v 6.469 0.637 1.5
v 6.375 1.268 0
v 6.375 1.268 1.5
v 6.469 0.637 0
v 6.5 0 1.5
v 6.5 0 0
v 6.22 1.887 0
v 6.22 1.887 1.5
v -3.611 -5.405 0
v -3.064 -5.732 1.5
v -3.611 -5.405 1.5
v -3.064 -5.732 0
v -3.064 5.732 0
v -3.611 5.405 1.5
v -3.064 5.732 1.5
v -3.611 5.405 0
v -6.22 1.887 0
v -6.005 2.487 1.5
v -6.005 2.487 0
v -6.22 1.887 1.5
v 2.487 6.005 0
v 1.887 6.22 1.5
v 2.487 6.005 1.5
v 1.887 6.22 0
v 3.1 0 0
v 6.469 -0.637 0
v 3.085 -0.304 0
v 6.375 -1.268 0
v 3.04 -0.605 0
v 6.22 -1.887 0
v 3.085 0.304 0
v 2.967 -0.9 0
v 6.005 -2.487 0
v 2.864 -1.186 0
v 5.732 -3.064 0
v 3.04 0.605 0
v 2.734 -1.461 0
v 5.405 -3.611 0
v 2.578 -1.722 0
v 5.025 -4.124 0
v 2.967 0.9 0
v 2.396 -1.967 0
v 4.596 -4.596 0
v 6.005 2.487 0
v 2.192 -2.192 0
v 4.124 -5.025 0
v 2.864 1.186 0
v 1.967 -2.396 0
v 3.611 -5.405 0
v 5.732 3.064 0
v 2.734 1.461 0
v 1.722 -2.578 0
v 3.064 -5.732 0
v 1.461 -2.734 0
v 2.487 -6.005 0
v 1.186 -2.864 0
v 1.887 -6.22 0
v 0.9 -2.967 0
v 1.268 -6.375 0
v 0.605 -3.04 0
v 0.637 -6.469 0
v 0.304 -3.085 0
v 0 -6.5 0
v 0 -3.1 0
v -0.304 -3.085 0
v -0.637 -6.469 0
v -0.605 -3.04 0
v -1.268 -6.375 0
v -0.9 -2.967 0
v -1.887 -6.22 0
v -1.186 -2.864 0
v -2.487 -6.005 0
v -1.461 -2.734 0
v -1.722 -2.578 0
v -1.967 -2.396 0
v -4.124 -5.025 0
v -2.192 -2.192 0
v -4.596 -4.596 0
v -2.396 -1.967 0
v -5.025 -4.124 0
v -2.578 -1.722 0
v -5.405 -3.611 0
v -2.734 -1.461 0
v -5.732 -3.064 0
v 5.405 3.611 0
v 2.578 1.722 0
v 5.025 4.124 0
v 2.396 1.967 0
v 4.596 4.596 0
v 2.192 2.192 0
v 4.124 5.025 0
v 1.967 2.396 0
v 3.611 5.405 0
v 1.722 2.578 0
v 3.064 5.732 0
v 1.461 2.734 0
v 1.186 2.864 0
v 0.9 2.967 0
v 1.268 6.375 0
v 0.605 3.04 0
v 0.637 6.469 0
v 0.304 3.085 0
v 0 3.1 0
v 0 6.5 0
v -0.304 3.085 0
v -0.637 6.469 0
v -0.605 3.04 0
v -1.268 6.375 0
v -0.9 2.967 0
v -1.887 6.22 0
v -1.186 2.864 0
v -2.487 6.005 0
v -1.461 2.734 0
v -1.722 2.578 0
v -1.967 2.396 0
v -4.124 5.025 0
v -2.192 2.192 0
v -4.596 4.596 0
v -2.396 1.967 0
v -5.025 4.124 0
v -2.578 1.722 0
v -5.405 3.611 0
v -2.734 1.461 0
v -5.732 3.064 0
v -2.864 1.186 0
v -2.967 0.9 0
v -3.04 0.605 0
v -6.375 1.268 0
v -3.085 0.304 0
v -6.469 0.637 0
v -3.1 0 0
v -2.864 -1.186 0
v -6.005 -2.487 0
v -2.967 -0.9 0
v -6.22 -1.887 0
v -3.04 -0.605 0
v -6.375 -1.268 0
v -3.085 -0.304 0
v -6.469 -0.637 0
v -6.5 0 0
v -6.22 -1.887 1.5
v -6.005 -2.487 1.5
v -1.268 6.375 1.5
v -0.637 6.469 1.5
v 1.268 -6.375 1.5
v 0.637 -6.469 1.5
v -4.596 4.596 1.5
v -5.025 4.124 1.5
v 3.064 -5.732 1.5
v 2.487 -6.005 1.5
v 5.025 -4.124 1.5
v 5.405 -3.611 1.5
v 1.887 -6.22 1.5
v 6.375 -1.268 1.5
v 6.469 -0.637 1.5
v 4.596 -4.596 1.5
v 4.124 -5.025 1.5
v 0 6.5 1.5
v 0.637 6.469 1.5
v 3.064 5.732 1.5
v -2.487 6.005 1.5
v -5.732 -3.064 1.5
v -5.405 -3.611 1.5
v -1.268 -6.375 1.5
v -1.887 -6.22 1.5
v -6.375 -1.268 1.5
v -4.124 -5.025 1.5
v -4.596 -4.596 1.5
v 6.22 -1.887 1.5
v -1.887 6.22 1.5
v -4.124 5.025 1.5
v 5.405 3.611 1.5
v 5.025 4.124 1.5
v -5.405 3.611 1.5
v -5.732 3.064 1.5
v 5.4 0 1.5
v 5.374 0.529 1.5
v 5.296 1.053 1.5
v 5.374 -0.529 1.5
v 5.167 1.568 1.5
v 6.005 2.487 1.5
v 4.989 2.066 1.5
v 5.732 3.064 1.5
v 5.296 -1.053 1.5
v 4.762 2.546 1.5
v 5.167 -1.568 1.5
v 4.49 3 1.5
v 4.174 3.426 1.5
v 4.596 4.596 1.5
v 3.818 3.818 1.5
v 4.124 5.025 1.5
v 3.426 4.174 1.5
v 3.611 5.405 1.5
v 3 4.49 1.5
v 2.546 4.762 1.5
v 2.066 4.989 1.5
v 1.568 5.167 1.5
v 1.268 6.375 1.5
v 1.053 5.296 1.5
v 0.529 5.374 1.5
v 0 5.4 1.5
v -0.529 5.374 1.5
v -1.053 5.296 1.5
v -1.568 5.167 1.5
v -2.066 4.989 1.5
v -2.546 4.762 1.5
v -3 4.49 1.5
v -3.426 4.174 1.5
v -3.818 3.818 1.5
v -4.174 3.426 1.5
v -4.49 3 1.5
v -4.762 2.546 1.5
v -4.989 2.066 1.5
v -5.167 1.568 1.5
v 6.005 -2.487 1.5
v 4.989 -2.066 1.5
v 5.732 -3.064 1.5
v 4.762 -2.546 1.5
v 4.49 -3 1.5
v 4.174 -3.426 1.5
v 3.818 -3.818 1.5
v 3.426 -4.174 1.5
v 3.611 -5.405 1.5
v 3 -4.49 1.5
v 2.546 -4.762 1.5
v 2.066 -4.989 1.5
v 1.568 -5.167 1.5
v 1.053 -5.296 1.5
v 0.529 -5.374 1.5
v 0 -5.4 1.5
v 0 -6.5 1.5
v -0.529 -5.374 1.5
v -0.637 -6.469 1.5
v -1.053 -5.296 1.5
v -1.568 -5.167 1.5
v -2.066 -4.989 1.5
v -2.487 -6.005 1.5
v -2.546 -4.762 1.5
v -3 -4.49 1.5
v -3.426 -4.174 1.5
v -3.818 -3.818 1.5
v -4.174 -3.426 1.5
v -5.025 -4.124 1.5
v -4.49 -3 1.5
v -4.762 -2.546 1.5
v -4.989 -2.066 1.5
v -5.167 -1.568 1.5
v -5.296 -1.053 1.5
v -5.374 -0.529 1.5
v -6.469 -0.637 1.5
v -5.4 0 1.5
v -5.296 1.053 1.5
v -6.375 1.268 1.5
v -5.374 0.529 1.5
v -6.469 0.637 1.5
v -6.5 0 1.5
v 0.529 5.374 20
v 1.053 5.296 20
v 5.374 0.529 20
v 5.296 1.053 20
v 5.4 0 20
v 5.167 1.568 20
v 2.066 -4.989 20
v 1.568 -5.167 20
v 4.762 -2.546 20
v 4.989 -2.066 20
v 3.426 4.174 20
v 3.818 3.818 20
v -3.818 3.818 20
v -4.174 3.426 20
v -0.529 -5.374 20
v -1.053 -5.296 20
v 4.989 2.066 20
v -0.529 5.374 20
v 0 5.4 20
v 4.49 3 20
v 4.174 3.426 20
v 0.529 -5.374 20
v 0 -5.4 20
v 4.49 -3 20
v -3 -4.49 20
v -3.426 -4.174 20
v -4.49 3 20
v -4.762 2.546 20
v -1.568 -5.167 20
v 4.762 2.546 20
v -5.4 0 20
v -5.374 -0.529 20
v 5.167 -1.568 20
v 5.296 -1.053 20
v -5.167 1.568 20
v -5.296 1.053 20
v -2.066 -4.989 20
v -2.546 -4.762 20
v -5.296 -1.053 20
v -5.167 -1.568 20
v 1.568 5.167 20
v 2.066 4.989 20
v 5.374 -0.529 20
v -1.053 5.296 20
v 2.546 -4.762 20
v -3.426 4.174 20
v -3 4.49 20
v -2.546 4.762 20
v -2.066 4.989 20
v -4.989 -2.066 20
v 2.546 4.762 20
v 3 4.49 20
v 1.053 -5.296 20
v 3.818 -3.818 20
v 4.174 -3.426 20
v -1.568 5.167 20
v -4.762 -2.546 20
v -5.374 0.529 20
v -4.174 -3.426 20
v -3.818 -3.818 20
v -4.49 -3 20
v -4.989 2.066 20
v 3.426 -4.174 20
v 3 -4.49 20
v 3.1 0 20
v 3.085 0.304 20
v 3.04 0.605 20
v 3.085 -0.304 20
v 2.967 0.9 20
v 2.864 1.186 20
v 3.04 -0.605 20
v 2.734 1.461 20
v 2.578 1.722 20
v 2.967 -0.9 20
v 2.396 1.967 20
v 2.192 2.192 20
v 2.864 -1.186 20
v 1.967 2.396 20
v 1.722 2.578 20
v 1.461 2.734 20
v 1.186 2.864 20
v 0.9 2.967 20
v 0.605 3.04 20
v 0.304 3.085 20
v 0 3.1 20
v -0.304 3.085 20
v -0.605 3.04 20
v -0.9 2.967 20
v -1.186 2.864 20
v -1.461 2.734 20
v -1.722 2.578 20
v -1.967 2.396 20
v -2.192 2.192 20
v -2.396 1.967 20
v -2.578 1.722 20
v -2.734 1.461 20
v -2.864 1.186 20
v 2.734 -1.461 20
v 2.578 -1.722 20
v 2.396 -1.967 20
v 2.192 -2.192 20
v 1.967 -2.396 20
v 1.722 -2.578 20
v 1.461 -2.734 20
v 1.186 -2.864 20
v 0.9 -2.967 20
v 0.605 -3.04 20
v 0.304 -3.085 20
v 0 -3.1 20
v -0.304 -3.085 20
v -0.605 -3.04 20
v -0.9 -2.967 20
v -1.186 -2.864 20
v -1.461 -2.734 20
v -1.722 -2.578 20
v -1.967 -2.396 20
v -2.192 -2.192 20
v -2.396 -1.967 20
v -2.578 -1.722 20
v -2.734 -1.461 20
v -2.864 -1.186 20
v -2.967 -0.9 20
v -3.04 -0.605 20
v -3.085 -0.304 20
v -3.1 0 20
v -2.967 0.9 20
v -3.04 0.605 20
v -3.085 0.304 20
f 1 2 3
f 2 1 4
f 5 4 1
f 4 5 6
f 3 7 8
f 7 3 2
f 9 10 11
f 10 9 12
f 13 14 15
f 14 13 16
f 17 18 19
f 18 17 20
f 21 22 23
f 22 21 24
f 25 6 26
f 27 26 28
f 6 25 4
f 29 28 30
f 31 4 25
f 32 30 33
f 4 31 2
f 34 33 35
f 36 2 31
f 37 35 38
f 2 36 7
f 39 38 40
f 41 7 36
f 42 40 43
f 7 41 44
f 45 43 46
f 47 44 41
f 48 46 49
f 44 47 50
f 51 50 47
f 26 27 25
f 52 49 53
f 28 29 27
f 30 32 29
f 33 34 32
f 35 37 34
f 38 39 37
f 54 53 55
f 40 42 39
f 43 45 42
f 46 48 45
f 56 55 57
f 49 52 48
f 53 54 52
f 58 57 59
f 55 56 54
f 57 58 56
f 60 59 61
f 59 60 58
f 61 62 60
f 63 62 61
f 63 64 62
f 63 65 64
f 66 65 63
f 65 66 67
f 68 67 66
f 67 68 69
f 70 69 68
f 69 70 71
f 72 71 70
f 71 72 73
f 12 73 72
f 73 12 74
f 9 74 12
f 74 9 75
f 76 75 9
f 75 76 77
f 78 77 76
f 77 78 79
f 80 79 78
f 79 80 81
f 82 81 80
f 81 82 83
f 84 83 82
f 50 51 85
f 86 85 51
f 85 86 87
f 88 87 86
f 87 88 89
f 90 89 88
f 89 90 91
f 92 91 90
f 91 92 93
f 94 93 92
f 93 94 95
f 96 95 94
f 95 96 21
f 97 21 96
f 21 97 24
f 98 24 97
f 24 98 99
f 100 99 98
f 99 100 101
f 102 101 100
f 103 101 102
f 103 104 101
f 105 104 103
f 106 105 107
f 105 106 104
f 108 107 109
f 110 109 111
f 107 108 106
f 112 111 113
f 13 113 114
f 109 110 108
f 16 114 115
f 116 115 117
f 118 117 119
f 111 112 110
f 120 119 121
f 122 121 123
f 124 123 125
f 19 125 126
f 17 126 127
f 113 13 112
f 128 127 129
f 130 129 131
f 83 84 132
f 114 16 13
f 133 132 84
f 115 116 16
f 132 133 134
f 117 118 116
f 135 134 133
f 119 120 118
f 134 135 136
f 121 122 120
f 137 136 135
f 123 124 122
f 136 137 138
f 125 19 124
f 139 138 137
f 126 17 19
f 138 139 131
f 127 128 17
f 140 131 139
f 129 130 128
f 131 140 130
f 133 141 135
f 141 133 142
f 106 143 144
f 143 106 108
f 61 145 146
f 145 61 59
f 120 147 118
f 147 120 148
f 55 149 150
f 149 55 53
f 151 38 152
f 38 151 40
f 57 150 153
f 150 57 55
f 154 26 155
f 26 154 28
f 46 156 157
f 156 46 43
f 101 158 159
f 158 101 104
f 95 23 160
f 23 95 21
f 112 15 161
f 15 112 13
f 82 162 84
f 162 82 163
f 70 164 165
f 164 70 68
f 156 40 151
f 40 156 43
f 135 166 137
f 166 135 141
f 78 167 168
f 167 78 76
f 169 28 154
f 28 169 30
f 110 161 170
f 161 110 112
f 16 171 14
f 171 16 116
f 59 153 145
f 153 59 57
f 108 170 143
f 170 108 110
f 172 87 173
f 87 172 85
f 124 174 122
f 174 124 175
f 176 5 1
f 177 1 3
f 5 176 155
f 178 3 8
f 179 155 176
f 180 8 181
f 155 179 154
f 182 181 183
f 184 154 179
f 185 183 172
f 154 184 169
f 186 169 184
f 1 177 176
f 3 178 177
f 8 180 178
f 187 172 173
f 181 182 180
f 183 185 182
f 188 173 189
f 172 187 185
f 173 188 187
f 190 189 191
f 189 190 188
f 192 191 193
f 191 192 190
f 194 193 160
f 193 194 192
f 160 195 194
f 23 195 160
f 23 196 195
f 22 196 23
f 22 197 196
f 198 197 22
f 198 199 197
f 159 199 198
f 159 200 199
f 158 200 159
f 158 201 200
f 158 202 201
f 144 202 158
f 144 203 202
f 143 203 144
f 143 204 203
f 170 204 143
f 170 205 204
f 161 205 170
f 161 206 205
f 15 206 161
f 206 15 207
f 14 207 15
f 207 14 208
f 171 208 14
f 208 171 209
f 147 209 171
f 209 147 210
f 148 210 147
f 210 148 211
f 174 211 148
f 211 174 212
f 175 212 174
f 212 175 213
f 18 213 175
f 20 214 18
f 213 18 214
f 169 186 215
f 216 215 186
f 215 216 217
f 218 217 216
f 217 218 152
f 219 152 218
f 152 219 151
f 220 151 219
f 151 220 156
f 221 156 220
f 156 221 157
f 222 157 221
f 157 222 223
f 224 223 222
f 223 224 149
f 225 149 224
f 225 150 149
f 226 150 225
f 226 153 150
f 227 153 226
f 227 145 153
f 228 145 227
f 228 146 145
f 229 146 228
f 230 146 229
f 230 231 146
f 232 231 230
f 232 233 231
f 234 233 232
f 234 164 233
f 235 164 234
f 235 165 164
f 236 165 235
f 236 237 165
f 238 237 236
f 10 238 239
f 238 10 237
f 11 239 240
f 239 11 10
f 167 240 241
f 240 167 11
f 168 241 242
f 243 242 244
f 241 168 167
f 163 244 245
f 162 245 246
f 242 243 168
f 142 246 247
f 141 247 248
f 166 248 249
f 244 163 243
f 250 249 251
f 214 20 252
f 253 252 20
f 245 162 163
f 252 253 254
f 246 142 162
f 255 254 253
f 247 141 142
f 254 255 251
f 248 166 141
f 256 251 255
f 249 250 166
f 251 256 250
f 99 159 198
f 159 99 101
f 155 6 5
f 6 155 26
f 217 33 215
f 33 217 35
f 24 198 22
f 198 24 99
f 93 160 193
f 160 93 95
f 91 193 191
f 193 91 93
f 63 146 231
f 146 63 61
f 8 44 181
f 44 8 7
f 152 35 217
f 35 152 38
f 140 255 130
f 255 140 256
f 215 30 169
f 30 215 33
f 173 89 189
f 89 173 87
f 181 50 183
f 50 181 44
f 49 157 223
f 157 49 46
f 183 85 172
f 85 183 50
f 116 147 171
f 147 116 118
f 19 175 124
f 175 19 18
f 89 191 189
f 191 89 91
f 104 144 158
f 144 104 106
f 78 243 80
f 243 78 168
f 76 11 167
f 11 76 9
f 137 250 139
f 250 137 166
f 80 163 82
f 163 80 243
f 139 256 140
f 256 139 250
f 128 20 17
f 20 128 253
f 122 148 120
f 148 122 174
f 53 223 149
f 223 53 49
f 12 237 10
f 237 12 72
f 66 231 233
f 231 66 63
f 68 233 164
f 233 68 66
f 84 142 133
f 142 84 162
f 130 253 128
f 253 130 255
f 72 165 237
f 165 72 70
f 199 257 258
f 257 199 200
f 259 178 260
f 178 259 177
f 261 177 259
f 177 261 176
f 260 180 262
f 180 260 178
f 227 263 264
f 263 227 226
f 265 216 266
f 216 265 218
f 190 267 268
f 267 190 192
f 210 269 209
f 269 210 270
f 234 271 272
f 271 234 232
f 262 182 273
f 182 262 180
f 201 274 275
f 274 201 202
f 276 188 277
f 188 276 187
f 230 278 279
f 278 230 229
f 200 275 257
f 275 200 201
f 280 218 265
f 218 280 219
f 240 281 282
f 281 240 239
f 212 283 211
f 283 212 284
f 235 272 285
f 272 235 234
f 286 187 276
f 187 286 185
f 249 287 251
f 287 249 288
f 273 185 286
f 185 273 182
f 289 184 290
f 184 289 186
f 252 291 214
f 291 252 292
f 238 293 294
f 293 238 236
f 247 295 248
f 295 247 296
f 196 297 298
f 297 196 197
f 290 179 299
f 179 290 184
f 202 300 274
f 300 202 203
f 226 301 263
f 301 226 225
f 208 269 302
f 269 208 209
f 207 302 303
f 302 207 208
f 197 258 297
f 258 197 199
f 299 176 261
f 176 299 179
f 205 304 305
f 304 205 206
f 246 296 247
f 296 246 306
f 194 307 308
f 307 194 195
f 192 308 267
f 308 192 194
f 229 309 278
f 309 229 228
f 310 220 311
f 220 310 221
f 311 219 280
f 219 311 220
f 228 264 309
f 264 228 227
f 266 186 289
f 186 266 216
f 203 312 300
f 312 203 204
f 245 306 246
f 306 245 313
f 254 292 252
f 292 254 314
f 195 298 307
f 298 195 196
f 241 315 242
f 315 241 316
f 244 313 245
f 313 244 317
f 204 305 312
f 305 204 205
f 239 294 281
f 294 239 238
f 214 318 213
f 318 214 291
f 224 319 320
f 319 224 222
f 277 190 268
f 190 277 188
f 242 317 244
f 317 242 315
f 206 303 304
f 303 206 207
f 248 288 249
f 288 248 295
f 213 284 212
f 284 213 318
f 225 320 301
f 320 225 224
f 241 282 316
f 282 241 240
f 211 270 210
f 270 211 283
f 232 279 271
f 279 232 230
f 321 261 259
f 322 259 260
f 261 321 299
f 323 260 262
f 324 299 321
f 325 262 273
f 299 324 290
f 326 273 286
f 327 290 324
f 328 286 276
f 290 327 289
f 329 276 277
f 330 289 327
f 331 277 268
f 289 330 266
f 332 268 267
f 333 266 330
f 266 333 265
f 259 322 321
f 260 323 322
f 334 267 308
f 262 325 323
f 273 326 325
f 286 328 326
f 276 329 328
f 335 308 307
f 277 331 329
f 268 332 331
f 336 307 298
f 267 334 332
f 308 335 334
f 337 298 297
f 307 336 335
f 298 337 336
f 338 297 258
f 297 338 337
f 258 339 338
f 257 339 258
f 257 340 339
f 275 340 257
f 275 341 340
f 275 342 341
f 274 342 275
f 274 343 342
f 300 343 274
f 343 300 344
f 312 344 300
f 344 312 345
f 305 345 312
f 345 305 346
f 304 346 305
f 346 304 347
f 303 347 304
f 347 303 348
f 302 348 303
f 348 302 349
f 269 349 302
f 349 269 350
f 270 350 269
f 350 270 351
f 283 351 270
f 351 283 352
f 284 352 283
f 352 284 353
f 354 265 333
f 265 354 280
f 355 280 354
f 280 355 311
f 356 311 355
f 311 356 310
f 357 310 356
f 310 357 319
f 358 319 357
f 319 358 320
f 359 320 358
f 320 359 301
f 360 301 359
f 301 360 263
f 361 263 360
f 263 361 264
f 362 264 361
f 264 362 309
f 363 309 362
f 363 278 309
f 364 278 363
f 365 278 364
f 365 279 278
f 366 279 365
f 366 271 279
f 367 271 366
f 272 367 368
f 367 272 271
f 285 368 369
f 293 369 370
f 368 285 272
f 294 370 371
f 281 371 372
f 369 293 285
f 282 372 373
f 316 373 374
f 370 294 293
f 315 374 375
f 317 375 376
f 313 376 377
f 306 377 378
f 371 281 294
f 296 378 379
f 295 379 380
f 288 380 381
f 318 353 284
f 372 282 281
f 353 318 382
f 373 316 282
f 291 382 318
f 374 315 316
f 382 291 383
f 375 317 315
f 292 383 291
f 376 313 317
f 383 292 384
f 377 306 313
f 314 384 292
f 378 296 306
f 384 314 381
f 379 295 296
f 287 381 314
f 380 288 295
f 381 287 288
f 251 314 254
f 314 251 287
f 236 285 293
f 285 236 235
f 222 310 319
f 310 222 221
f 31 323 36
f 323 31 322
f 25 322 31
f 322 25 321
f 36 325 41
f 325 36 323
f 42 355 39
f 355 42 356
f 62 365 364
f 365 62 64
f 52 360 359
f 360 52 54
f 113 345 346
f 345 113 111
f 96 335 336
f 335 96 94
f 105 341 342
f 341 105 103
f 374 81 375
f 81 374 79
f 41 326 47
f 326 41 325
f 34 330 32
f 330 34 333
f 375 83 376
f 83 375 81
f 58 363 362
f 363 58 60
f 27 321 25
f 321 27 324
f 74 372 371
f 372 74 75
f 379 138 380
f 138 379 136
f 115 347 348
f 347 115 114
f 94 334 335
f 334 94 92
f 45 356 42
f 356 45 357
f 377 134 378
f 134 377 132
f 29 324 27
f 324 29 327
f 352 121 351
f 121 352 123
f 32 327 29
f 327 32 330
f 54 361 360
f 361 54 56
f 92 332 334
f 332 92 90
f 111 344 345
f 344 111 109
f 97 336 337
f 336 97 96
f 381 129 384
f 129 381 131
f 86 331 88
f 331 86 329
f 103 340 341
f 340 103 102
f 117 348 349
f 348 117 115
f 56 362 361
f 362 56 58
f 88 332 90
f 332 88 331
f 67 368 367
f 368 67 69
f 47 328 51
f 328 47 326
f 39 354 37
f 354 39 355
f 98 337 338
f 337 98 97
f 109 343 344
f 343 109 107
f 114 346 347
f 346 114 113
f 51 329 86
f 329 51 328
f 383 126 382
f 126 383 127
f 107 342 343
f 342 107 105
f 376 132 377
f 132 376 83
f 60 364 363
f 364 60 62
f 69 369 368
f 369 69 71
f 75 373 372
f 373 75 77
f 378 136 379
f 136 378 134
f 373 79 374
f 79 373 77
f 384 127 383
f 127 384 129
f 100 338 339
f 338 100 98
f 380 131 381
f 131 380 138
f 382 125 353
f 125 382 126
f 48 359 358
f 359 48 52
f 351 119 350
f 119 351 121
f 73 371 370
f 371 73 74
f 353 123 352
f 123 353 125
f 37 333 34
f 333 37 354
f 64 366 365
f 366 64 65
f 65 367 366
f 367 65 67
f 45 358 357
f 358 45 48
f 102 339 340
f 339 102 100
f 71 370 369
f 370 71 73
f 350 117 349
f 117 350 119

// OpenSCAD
// Dimensions in millimetres
collar_od = 13;
collar_height = 1.5;
body_od = 10.8;
total_height = 21.5;
bore_diameter = 6.2;
hole_extension = 0.1;
body_height = total_height - collar_height;

// Ensure smooth curves on all cylindrical surfaces
$fn = 64;

module adapter() {
    difference() {
        union() {
            // Collar (bottom): Z = 0 to Z = collar_height
            cylinder(h = collar_height, r = collar_od / 2, center = [0, 0, collar_height / 2]);
            
            // Body (top): Z = collar_height to Z = total_height
            cylinder(h = body_height, r = body_od / 2, center = [0, 0, collar_height + body_height / 2]);
        }
        
        // Bore hole: Extends past Z=0 and Z=total_height to ensure clean cuts
        cylinder(h = total_height + hole_extension, r = bore_diameter / 2, center = [0, 0, total_height / 2]);
    }
}

adapter();
